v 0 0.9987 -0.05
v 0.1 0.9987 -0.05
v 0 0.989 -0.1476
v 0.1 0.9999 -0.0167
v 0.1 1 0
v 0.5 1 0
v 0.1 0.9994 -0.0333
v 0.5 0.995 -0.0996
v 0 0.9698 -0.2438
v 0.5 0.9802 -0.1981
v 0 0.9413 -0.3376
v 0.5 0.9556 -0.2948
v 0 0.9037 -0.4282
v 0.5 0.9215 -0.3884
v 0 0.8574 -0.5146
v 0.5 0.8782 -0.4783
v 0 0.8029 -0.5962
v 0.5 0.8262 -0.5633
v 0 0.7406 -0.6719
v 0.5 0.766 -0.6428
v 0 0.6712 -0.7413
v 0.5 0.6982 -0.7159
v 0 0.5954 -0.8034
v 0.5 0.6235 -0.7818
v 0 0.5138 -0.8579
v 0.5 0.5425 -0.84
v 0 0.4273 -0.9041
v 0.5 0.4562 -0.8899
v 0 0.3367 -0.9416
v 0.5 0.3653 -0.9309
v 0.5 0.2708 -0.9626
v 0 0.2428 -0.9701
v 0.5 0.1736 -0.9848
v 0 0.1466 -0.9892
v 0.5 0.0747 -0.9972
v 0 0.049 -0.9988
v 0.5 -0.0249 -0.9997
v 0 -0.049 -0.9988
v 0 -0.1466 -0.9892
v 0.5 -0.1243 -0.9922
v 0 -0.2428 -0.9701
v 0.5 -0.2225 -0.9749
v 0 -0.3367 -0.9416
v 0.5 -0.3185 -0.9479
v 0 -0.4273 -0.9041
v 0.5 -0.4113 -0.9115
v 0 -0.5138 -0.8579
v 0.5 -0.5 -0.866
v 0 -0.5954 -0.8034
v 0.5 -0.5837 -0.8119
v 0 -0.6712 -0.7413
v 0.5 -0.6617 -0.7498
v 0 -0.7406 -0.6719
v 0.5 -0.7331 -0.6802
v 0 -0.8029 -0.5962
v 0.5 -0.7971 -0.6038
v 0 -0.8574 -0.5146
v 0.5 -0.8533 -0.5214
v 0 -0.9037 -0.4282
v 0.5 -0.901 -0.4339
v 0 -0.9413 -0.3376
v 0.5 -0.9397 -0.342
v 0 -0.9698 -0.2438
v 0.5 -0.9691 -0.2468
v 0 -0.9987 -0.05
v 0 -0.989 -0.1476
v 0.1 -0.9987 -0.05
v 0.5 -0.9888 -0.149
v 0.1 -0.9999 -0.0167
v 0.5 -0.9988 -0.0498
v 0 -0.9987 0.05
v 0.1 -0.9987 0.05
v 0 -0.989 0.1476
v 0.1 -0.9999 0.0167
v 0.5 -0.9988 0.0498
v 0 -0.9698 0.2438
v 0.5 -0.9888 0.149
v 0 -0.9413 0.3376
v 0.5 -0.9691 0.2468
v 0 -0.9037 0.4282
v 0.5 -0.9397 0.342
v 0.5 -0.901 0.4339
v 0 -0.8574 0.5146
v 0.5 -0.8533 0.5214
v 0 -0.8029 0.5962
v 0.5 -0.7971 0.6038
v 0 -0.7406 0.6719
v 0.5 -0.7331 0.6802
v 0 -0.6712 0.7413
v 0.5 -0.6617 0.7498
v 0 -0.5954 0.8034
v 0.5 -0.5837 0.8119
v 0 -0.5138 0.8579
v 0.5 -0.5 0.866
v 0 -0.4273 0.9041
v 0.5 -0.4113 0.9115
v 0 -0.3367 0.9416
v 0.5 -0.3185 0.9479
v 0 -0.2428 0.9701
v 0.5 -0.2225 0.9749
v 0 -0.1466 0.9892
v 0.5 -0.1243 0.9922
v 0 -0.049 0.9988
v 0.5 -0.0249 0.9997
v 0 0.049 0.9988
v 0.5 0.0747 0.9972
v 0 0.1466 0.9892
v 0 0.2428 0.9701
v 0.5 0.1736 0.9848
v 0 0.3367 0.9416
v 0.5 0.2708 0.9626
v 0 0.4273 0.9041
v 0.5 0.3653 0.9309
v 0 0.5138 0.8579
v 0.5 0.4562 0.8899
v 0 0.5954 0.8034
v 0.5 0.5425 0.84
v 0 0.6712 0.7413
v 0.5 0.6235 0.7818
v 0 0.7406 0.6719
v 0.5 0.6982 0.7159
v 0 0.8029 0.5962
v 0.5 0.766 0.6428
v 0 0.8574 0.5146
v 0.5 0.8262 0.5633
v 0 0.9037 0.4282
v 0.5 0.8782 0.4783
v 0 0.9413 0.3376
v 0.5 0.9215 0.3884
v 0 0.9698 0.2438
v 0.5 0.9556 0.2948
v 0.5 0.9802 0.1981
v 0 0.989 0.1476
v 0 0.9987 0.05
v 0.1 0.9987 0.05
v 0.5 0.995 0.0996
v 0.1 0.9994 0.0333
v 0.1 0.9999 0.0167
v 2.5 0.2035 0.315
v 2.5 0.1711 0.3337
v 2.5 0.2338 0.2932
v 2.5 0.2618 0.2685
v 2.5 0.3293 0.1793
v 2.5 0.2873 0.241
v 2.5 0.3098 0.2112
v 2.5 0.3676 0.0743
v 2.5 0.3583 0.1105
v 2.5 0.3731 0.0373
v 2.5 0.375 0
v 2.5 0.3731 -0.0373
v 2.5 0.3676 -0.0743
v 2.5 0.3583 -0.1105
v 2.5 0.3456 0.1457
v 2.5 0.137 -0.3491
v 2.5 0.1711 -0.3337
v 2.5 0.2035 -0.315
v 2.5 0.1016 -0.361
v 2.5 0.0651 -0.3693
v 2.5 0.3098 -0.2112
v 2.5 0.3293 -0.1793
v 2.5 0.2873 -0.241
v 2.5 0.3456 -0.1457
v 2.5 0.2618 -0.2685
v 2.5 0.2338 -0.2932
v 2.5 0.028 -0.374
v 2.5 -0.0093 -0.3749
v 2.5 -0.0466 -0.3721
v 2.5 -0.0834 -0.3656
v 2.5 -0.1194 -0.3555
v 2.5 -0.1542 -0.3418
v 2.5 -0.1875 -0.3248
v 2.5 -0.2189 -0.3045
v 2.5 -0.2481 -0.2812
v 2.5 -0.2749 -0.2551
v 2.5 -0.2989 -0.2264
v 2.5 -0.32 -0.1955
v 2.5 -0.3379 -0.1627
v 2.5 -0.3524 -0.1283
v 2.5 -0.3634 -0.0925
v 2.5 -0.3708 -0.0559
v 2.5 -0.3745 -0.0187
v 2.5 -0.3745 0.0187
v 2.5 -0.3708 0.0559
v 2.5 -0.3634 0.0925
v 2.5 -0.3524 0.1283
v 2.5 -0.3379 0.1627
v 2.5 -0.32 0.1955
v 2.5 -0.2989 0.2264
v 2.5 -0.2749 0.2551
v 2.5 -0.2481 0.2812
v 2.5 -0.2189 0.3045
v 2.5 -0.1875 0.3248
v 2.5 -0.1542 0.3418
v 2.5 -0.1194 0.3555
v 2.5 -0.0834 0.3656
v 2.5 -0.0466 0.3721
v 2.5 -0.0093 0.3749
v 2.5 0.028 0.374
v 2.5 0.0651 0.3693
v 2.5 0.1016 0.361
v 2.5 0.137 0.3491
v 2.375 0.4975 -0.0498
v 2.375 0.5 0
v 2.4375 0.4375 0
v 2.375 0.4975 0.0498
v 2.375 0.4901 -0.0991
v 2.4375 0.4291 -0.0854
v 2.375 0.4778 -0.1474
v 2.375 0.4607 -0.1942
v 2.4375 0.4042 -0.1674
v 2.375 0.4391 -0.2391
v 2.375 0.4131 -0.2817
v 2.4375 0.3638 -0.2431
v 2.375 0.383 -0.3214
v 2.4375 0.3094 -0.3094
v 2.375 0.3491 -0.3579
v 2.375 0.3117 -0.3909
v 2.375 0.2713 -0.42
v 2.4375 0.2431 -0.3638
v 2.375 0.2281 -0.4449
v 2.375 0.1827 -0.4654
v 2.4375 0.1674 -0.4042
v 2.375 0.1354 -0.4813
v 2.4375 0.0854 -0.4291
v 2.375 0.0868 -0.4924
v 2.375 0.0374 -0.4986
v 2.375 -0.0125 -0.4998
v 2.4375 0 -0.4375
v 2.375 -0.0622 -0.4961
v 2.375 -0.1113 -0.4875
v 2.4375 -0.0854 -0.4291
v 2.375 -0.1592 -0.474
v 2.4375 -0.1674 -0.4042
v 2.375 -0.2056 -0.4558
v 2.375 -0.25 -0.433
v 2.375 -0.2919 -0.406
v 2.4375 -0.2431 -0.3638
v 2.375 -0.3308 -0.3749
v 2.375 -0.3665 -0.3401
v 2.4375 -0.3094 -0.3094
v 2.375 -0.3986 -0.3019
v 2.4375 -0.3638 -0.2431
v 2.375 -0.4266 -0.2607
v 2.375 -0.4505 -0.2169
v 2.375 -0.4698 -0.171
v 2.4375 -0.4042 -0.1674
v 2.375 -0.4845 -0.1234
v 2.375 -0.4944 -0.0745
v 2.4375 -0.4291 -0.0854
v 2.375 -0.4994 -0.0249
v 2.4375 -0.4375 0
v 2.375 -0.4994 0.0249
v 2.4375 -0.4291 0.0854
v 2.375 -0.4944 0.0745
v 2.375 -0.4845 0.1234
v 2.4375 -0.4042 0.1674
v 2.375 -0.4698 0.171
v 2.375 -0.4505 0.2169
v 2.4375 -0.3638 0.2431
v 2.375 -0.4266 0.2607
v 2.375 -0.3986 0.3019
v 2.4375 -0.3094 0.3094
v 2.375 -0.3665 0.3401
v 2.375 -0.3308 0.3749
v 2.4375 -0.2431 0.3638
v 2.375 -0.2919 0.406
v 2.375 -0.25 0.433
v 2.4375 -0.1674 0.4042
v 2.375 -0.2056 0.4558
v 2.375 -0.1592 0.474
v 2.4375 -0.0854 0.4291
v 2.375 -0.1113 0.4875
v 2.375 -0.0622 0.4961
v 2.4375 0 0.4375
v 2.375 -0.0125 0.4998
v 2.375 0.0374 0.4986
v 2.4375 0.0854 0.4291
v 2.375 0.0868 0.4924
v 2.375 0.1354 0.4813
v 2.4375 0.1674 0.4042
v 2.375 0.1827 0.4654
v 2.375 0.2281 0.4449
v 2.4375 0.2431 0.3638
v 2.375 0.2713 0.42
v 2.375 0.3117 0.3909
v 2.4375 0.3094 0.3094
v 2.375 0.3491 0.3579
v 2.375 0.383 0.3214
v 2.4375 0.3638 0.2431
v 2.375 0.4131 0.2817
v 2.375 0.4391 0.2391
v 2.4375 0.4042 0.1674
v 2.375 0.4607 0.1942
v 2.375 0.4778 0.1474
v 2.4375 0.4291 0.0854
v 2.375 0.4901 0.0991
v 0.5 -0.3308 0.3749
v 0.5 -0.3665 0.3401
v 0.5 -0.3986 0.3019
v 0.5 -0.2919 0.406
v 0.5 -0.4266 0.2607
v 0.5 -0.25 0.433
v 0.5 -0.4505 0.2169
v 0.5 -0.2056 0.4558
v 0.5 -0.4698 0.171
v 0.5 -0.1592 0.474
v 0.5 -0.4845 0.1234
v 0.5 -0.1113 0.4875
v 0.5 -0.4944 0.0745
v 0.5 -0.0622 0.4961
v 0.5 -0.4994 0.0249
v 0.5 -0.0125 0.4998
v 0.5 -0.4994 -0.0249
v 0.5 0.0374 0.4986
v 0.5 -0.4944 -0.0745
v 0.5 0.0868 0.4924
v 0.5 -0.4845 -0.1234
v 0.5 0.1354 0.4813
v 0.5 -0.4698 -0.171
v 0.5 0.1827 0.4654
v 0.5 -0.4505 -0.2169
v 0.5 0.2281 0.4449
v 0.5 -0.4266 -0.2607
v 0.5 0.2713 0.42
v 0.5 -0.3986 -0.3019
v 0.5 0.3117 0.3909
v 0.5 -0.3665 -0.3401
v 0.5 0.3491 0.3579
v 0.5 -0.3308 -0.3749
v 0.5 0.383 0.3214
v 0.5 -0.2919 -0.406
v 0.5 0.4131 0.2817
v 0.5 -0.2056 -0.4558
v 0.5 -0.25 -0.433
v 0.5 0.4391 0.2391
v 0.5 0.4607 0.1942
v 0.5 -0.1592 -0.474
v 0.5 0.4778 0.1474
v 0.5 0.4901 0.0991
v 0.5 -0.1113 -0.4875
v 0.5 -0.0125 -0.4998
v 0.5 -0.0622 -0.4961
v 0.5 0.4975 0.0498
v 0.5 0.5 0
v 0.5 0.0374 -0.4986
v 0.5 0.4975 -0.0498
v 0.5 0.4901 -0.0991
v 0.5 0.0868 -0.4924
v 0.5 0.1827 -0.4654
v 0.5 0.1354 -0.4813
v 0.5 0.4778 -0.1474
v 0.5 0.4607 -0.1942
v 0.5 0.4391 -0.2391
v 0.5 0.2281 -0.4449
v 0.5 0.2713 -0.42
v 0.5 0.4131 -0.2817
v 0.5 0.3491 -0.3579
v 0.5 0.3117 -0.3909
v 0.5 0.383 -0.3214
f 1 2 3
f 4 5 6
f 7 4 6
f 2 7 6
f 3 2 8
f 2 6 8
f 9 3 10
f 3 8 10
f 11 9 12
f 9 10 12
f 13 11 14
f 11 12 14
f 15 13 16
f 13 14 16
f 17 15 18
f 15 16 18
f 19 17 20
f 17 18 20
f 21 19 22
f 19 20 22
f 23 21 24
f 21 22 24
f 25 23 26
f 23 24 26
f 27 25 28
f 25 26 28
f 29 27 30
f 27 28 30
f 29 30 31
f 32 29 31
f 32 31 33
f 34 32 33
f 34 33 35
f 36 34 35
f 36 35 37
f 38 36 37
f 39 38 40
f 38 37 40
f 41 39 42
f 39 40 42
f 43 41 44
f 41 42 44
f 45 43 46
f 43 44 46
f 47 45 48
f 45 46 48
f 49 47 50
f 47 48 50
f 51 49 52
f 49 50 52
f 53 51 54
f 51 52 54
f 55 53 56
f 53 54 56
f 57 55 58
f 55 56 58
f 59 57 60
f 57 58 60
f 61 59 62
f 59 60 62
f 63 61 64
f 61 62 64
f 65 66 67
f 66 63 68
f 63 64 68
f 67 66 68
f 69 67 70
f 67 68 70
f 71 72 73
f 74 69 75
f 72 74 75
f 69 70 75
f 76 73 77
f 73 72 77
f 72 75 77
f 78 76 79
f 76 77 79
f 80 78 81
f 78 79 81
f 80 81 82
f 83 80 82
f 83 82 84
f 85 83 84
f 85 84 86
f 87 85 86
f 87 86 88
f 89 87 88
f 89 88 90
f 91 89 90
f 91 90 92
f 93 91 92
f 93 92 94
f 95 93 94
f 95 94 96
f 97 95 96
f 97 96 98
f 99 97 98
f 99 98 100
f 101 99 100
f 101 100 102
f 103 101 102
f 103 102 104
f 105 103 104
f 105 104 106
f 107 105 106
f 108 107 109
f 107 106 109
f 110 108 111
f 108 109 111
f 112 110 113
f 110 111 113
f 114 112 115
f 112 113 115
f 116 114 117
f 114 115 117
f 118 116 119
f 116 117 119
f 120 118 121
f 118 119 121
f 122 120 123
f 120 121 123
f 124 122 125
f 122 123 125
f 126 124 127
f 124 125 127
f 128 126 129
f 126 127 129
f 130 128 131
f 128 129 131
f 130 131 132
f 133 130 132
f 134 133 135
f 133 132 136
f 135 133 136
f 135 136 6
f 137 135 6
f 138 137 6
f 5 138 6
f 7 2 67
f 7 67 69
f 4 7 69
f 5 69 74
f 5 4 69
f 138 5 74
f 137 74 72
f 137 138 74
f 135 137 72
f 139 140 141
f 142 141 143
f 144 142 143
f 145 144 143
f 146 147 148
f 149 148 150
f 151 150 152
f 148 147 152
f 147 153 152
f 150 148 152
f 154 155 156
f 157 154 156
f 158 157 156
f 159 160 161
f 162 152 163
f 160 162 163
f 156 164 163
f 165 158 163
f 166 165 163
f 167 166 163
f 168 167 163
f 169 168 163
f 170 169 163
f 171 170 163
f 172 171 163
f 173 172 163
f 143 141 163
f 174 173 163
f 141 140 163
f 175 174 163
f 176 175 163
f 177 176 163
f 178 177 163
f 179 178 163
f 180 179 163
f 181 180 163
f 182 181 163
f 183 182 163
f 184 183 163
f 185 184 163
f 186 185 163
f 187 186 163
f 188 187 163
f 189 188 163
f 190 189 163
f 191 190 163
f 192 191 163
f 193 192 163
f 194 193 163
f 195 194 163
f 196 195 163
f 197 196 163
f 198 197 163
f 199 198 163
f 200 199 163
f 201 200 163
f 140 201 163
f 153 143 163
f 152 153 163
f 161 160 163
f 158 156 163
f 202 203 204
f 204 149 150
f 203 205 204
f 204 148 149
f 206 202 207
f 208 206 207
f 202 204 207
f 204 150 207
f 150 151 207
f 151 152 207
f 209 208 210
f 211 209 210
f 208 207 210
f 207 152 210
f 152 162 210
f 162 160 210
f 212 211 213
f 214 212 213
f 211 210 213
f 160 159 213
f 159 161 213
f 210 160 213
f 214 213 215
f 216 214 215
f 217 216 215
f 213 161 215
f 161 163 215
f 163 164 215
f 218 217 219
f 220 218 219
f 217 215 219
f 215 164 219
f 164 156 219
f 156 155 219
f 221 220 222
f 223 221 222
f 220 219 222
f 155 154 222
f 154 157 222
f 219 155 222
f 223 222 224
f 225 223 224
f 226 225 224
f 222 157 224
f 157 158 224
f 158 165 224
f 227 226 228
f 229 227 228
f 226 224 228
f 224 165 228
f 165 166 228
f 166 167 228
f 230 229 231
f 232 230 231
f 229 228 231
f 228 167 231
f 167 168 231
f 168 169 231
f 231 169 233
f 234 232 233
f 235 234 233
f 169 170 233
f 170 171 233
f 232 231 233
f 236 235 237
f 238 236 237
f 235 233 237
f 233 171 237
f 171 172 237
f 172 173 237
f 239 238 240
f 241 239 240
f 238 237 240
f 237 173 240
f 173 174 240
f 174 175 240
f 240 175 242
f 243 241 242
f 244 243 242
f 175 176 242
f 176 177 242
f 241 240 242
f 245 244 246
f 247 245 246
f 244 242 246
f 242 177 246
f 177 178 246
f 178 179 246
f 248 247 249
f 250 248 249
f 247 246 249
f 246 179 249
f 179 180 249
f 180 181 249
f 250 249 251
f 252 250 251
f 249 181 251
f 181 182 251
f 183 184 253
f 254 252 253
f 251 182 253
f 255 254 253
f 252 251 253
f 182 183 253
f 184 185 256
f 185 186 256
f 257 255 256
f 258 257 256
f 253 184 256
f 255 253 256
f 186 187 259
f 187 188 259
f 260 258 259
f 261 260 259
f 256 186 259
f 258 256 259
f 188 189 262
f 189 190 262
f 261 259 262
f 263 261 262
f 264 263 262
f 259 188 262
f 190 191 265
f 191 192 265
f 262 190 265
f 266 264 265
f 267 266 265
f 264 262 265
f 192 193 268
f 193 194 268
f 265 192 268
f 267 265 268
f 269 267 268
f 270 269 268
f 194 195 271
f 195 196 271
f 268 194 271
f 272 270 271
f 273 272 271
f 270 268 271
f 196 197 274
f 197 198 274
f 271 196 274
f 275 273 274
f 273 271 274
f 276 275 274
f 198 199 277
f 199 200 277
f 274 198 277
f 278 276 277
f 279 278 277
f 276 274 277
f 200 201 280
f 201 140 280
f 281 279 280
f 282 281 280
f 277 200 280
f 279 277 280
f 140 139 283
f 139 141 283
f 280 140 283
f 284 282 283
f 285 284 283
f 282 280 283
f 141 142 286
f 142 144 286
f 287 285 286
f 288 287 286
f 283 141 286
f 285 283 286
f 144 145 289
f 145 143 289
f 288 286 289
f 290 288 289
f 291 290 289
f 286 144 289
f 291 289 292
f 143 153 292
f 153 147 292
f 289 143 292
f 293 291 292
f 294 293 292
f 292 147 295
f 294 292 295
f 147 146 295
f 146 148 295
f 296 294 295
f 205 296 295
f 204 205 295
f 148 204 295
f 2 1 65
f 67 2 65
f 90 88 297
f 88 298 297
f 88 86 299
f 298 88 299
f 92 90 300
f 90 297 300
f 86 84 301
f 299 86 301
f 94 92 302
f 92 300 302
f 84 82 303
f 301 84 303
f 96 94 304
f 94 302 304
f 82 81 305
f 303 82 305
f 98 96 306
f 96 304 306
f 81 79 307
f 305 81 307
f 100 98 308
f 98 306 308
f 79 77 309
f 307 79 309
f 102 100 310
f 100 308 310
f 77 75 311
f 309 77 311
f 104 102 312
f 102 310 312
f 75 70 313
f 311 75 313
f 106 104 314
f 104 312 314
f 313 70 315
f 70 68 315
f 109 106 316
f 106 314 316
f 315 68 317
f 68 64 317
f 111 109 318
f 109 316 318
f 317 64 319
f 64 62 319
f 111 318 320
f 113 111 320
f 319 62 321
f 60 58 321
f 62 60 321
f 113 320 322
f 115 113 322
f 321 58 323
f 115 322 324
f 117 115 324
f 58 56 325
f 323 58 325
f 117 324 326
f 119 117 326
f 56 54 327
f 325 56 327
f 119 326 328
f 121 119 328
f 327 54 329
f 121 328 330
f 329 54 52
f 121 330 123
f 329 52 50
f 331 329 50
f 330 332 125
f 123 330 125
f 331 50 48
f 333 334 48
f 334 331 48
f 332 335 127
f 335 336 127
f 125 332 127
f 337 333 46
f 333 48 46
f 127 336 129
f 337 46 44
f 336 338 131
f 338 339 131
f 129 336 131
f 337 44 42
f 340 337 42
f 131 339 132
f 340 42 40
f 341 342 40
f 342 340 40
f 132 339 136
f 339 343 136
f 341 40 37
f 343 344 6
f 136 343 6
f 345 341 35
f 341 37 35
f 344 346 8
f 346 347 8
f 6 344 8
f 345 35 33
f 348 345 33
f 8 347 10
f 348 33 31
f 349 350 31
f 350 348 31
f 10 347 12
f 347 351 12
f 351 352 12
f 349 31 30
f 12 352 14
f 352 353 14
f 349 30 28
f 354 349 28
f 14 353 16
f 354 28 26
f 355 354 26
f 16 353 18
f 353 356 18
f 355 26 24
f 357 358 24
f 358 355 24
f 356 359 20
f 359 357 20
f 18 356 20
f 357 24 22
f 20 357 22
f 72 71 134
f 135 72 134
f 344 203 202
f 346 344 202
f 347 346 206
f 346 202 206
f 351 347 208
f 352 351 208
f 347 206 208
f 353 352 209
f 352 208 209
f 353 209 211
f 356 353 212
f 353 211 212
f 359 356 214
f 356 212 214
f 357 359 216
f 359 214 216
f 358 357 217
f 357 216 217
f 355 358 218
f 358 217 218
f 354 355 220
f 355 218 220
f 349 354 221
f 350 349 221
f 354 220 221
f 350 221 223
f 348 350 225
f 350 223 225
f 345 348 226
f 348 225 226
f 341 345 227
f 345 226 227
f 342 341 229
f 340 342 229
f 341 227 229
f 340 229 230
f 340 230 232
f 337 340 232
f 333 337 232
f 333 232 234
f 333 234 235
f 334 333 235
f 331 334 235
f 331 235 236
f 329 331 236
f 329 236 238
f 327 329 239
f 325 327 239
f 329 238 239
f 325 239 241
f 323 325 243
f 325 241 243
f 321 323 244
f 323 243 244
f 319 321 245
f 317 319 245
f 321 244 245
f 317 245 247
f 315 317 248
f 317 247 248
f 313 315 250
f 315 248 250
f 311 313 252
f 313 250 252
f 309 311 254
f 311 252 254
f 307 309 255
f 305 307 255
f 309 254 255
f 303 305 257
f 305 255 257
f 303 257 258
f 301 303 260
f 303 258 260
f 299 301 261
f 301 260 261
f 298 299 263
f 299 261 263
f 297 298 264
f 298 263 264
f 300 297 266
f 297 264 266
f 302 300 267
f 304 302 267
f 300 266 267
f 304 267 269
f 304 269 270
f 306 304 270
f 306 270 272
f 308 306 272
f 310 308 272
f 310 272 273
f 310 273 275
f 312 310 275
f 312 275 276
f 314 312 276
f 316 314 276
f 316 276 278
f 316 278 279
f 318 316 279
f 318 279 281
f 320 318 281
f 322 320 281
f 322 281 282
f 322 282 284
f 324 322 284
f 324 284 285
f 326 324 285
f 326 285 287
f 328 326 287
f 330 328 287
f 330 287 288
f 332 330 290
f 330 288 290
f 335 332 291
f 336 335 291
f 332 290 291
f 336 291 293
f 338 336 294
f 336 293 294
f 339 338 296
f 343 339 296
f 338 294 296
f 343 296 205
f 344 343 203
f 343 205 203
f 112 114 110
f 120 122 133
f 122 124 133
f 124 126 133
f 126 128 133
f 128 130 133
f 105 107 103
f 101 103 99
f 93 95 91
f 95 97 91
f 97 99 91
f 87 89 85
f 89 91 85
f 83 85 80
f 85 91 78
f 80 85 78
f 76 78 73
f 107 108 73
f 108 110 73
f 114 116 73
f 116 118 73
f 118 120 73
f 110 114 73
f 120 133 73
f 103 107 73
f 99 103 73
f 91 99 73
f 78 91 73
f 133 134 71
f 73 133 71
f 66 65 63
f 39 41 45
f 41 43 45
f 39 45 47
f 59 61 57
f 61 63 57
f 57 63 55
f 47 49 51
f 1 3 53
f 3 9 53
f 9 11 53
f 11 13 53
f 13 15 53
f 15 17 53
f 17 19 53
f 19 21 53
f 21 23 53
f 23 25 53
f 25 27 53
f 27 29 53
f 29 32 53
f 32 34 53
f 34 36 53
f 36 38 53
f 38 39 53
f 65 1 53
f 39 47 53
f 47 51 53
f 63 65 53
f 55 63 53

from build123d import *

# Parameters (mm, degrees)
CHAFL_N1_SIZE         = 0.125
CORTAR_EXTRUIR1_DEPTH = 0.1


with BuildPart() as part:
    # Croquis1 → Revolución1 (revolve)
    with BuildSketch(Plane.XY):
        Polygon((0, 0), (0, 1), (0.5, 1), (0.5, 0.5), (2.5, 0.5), (2.5, 0), align=None)
    revolve(axis=Axis((2.5, 0, 0), (-1, 0, 0)))

    # Chaflán1
    chafl_n1_edges = [part.edges().sort_by_distance(p)[0] for p in [
        (2.5, -0.5, 0),
    ]]
    chamfer(chafl_n1_edges, length=CHAFL_N1_SIZE)

    # Croquis5 → Cortar-Extruir1 (cut)
    with BuildSketch(Plane.ZY):
        with BuildLine():
            Line((-0.05, 0.998749218), (-0.05, -0.998749218))
            ThreePointArc((-0.05, -0.998749218), (0, -1), (0.05, -0.998749218))
            Line((0.05, -0.998749218), (0.05, 0.998749218))
            ThreePointArc((0.05, 0.998749218), (0, 1), (-0.05, 0.998749218))
        make_face()
    extrude(amount=-CORTAR_EXTRUIR1_DEPTH, mode=Mode.SUBTRACT)


solid = part.part
